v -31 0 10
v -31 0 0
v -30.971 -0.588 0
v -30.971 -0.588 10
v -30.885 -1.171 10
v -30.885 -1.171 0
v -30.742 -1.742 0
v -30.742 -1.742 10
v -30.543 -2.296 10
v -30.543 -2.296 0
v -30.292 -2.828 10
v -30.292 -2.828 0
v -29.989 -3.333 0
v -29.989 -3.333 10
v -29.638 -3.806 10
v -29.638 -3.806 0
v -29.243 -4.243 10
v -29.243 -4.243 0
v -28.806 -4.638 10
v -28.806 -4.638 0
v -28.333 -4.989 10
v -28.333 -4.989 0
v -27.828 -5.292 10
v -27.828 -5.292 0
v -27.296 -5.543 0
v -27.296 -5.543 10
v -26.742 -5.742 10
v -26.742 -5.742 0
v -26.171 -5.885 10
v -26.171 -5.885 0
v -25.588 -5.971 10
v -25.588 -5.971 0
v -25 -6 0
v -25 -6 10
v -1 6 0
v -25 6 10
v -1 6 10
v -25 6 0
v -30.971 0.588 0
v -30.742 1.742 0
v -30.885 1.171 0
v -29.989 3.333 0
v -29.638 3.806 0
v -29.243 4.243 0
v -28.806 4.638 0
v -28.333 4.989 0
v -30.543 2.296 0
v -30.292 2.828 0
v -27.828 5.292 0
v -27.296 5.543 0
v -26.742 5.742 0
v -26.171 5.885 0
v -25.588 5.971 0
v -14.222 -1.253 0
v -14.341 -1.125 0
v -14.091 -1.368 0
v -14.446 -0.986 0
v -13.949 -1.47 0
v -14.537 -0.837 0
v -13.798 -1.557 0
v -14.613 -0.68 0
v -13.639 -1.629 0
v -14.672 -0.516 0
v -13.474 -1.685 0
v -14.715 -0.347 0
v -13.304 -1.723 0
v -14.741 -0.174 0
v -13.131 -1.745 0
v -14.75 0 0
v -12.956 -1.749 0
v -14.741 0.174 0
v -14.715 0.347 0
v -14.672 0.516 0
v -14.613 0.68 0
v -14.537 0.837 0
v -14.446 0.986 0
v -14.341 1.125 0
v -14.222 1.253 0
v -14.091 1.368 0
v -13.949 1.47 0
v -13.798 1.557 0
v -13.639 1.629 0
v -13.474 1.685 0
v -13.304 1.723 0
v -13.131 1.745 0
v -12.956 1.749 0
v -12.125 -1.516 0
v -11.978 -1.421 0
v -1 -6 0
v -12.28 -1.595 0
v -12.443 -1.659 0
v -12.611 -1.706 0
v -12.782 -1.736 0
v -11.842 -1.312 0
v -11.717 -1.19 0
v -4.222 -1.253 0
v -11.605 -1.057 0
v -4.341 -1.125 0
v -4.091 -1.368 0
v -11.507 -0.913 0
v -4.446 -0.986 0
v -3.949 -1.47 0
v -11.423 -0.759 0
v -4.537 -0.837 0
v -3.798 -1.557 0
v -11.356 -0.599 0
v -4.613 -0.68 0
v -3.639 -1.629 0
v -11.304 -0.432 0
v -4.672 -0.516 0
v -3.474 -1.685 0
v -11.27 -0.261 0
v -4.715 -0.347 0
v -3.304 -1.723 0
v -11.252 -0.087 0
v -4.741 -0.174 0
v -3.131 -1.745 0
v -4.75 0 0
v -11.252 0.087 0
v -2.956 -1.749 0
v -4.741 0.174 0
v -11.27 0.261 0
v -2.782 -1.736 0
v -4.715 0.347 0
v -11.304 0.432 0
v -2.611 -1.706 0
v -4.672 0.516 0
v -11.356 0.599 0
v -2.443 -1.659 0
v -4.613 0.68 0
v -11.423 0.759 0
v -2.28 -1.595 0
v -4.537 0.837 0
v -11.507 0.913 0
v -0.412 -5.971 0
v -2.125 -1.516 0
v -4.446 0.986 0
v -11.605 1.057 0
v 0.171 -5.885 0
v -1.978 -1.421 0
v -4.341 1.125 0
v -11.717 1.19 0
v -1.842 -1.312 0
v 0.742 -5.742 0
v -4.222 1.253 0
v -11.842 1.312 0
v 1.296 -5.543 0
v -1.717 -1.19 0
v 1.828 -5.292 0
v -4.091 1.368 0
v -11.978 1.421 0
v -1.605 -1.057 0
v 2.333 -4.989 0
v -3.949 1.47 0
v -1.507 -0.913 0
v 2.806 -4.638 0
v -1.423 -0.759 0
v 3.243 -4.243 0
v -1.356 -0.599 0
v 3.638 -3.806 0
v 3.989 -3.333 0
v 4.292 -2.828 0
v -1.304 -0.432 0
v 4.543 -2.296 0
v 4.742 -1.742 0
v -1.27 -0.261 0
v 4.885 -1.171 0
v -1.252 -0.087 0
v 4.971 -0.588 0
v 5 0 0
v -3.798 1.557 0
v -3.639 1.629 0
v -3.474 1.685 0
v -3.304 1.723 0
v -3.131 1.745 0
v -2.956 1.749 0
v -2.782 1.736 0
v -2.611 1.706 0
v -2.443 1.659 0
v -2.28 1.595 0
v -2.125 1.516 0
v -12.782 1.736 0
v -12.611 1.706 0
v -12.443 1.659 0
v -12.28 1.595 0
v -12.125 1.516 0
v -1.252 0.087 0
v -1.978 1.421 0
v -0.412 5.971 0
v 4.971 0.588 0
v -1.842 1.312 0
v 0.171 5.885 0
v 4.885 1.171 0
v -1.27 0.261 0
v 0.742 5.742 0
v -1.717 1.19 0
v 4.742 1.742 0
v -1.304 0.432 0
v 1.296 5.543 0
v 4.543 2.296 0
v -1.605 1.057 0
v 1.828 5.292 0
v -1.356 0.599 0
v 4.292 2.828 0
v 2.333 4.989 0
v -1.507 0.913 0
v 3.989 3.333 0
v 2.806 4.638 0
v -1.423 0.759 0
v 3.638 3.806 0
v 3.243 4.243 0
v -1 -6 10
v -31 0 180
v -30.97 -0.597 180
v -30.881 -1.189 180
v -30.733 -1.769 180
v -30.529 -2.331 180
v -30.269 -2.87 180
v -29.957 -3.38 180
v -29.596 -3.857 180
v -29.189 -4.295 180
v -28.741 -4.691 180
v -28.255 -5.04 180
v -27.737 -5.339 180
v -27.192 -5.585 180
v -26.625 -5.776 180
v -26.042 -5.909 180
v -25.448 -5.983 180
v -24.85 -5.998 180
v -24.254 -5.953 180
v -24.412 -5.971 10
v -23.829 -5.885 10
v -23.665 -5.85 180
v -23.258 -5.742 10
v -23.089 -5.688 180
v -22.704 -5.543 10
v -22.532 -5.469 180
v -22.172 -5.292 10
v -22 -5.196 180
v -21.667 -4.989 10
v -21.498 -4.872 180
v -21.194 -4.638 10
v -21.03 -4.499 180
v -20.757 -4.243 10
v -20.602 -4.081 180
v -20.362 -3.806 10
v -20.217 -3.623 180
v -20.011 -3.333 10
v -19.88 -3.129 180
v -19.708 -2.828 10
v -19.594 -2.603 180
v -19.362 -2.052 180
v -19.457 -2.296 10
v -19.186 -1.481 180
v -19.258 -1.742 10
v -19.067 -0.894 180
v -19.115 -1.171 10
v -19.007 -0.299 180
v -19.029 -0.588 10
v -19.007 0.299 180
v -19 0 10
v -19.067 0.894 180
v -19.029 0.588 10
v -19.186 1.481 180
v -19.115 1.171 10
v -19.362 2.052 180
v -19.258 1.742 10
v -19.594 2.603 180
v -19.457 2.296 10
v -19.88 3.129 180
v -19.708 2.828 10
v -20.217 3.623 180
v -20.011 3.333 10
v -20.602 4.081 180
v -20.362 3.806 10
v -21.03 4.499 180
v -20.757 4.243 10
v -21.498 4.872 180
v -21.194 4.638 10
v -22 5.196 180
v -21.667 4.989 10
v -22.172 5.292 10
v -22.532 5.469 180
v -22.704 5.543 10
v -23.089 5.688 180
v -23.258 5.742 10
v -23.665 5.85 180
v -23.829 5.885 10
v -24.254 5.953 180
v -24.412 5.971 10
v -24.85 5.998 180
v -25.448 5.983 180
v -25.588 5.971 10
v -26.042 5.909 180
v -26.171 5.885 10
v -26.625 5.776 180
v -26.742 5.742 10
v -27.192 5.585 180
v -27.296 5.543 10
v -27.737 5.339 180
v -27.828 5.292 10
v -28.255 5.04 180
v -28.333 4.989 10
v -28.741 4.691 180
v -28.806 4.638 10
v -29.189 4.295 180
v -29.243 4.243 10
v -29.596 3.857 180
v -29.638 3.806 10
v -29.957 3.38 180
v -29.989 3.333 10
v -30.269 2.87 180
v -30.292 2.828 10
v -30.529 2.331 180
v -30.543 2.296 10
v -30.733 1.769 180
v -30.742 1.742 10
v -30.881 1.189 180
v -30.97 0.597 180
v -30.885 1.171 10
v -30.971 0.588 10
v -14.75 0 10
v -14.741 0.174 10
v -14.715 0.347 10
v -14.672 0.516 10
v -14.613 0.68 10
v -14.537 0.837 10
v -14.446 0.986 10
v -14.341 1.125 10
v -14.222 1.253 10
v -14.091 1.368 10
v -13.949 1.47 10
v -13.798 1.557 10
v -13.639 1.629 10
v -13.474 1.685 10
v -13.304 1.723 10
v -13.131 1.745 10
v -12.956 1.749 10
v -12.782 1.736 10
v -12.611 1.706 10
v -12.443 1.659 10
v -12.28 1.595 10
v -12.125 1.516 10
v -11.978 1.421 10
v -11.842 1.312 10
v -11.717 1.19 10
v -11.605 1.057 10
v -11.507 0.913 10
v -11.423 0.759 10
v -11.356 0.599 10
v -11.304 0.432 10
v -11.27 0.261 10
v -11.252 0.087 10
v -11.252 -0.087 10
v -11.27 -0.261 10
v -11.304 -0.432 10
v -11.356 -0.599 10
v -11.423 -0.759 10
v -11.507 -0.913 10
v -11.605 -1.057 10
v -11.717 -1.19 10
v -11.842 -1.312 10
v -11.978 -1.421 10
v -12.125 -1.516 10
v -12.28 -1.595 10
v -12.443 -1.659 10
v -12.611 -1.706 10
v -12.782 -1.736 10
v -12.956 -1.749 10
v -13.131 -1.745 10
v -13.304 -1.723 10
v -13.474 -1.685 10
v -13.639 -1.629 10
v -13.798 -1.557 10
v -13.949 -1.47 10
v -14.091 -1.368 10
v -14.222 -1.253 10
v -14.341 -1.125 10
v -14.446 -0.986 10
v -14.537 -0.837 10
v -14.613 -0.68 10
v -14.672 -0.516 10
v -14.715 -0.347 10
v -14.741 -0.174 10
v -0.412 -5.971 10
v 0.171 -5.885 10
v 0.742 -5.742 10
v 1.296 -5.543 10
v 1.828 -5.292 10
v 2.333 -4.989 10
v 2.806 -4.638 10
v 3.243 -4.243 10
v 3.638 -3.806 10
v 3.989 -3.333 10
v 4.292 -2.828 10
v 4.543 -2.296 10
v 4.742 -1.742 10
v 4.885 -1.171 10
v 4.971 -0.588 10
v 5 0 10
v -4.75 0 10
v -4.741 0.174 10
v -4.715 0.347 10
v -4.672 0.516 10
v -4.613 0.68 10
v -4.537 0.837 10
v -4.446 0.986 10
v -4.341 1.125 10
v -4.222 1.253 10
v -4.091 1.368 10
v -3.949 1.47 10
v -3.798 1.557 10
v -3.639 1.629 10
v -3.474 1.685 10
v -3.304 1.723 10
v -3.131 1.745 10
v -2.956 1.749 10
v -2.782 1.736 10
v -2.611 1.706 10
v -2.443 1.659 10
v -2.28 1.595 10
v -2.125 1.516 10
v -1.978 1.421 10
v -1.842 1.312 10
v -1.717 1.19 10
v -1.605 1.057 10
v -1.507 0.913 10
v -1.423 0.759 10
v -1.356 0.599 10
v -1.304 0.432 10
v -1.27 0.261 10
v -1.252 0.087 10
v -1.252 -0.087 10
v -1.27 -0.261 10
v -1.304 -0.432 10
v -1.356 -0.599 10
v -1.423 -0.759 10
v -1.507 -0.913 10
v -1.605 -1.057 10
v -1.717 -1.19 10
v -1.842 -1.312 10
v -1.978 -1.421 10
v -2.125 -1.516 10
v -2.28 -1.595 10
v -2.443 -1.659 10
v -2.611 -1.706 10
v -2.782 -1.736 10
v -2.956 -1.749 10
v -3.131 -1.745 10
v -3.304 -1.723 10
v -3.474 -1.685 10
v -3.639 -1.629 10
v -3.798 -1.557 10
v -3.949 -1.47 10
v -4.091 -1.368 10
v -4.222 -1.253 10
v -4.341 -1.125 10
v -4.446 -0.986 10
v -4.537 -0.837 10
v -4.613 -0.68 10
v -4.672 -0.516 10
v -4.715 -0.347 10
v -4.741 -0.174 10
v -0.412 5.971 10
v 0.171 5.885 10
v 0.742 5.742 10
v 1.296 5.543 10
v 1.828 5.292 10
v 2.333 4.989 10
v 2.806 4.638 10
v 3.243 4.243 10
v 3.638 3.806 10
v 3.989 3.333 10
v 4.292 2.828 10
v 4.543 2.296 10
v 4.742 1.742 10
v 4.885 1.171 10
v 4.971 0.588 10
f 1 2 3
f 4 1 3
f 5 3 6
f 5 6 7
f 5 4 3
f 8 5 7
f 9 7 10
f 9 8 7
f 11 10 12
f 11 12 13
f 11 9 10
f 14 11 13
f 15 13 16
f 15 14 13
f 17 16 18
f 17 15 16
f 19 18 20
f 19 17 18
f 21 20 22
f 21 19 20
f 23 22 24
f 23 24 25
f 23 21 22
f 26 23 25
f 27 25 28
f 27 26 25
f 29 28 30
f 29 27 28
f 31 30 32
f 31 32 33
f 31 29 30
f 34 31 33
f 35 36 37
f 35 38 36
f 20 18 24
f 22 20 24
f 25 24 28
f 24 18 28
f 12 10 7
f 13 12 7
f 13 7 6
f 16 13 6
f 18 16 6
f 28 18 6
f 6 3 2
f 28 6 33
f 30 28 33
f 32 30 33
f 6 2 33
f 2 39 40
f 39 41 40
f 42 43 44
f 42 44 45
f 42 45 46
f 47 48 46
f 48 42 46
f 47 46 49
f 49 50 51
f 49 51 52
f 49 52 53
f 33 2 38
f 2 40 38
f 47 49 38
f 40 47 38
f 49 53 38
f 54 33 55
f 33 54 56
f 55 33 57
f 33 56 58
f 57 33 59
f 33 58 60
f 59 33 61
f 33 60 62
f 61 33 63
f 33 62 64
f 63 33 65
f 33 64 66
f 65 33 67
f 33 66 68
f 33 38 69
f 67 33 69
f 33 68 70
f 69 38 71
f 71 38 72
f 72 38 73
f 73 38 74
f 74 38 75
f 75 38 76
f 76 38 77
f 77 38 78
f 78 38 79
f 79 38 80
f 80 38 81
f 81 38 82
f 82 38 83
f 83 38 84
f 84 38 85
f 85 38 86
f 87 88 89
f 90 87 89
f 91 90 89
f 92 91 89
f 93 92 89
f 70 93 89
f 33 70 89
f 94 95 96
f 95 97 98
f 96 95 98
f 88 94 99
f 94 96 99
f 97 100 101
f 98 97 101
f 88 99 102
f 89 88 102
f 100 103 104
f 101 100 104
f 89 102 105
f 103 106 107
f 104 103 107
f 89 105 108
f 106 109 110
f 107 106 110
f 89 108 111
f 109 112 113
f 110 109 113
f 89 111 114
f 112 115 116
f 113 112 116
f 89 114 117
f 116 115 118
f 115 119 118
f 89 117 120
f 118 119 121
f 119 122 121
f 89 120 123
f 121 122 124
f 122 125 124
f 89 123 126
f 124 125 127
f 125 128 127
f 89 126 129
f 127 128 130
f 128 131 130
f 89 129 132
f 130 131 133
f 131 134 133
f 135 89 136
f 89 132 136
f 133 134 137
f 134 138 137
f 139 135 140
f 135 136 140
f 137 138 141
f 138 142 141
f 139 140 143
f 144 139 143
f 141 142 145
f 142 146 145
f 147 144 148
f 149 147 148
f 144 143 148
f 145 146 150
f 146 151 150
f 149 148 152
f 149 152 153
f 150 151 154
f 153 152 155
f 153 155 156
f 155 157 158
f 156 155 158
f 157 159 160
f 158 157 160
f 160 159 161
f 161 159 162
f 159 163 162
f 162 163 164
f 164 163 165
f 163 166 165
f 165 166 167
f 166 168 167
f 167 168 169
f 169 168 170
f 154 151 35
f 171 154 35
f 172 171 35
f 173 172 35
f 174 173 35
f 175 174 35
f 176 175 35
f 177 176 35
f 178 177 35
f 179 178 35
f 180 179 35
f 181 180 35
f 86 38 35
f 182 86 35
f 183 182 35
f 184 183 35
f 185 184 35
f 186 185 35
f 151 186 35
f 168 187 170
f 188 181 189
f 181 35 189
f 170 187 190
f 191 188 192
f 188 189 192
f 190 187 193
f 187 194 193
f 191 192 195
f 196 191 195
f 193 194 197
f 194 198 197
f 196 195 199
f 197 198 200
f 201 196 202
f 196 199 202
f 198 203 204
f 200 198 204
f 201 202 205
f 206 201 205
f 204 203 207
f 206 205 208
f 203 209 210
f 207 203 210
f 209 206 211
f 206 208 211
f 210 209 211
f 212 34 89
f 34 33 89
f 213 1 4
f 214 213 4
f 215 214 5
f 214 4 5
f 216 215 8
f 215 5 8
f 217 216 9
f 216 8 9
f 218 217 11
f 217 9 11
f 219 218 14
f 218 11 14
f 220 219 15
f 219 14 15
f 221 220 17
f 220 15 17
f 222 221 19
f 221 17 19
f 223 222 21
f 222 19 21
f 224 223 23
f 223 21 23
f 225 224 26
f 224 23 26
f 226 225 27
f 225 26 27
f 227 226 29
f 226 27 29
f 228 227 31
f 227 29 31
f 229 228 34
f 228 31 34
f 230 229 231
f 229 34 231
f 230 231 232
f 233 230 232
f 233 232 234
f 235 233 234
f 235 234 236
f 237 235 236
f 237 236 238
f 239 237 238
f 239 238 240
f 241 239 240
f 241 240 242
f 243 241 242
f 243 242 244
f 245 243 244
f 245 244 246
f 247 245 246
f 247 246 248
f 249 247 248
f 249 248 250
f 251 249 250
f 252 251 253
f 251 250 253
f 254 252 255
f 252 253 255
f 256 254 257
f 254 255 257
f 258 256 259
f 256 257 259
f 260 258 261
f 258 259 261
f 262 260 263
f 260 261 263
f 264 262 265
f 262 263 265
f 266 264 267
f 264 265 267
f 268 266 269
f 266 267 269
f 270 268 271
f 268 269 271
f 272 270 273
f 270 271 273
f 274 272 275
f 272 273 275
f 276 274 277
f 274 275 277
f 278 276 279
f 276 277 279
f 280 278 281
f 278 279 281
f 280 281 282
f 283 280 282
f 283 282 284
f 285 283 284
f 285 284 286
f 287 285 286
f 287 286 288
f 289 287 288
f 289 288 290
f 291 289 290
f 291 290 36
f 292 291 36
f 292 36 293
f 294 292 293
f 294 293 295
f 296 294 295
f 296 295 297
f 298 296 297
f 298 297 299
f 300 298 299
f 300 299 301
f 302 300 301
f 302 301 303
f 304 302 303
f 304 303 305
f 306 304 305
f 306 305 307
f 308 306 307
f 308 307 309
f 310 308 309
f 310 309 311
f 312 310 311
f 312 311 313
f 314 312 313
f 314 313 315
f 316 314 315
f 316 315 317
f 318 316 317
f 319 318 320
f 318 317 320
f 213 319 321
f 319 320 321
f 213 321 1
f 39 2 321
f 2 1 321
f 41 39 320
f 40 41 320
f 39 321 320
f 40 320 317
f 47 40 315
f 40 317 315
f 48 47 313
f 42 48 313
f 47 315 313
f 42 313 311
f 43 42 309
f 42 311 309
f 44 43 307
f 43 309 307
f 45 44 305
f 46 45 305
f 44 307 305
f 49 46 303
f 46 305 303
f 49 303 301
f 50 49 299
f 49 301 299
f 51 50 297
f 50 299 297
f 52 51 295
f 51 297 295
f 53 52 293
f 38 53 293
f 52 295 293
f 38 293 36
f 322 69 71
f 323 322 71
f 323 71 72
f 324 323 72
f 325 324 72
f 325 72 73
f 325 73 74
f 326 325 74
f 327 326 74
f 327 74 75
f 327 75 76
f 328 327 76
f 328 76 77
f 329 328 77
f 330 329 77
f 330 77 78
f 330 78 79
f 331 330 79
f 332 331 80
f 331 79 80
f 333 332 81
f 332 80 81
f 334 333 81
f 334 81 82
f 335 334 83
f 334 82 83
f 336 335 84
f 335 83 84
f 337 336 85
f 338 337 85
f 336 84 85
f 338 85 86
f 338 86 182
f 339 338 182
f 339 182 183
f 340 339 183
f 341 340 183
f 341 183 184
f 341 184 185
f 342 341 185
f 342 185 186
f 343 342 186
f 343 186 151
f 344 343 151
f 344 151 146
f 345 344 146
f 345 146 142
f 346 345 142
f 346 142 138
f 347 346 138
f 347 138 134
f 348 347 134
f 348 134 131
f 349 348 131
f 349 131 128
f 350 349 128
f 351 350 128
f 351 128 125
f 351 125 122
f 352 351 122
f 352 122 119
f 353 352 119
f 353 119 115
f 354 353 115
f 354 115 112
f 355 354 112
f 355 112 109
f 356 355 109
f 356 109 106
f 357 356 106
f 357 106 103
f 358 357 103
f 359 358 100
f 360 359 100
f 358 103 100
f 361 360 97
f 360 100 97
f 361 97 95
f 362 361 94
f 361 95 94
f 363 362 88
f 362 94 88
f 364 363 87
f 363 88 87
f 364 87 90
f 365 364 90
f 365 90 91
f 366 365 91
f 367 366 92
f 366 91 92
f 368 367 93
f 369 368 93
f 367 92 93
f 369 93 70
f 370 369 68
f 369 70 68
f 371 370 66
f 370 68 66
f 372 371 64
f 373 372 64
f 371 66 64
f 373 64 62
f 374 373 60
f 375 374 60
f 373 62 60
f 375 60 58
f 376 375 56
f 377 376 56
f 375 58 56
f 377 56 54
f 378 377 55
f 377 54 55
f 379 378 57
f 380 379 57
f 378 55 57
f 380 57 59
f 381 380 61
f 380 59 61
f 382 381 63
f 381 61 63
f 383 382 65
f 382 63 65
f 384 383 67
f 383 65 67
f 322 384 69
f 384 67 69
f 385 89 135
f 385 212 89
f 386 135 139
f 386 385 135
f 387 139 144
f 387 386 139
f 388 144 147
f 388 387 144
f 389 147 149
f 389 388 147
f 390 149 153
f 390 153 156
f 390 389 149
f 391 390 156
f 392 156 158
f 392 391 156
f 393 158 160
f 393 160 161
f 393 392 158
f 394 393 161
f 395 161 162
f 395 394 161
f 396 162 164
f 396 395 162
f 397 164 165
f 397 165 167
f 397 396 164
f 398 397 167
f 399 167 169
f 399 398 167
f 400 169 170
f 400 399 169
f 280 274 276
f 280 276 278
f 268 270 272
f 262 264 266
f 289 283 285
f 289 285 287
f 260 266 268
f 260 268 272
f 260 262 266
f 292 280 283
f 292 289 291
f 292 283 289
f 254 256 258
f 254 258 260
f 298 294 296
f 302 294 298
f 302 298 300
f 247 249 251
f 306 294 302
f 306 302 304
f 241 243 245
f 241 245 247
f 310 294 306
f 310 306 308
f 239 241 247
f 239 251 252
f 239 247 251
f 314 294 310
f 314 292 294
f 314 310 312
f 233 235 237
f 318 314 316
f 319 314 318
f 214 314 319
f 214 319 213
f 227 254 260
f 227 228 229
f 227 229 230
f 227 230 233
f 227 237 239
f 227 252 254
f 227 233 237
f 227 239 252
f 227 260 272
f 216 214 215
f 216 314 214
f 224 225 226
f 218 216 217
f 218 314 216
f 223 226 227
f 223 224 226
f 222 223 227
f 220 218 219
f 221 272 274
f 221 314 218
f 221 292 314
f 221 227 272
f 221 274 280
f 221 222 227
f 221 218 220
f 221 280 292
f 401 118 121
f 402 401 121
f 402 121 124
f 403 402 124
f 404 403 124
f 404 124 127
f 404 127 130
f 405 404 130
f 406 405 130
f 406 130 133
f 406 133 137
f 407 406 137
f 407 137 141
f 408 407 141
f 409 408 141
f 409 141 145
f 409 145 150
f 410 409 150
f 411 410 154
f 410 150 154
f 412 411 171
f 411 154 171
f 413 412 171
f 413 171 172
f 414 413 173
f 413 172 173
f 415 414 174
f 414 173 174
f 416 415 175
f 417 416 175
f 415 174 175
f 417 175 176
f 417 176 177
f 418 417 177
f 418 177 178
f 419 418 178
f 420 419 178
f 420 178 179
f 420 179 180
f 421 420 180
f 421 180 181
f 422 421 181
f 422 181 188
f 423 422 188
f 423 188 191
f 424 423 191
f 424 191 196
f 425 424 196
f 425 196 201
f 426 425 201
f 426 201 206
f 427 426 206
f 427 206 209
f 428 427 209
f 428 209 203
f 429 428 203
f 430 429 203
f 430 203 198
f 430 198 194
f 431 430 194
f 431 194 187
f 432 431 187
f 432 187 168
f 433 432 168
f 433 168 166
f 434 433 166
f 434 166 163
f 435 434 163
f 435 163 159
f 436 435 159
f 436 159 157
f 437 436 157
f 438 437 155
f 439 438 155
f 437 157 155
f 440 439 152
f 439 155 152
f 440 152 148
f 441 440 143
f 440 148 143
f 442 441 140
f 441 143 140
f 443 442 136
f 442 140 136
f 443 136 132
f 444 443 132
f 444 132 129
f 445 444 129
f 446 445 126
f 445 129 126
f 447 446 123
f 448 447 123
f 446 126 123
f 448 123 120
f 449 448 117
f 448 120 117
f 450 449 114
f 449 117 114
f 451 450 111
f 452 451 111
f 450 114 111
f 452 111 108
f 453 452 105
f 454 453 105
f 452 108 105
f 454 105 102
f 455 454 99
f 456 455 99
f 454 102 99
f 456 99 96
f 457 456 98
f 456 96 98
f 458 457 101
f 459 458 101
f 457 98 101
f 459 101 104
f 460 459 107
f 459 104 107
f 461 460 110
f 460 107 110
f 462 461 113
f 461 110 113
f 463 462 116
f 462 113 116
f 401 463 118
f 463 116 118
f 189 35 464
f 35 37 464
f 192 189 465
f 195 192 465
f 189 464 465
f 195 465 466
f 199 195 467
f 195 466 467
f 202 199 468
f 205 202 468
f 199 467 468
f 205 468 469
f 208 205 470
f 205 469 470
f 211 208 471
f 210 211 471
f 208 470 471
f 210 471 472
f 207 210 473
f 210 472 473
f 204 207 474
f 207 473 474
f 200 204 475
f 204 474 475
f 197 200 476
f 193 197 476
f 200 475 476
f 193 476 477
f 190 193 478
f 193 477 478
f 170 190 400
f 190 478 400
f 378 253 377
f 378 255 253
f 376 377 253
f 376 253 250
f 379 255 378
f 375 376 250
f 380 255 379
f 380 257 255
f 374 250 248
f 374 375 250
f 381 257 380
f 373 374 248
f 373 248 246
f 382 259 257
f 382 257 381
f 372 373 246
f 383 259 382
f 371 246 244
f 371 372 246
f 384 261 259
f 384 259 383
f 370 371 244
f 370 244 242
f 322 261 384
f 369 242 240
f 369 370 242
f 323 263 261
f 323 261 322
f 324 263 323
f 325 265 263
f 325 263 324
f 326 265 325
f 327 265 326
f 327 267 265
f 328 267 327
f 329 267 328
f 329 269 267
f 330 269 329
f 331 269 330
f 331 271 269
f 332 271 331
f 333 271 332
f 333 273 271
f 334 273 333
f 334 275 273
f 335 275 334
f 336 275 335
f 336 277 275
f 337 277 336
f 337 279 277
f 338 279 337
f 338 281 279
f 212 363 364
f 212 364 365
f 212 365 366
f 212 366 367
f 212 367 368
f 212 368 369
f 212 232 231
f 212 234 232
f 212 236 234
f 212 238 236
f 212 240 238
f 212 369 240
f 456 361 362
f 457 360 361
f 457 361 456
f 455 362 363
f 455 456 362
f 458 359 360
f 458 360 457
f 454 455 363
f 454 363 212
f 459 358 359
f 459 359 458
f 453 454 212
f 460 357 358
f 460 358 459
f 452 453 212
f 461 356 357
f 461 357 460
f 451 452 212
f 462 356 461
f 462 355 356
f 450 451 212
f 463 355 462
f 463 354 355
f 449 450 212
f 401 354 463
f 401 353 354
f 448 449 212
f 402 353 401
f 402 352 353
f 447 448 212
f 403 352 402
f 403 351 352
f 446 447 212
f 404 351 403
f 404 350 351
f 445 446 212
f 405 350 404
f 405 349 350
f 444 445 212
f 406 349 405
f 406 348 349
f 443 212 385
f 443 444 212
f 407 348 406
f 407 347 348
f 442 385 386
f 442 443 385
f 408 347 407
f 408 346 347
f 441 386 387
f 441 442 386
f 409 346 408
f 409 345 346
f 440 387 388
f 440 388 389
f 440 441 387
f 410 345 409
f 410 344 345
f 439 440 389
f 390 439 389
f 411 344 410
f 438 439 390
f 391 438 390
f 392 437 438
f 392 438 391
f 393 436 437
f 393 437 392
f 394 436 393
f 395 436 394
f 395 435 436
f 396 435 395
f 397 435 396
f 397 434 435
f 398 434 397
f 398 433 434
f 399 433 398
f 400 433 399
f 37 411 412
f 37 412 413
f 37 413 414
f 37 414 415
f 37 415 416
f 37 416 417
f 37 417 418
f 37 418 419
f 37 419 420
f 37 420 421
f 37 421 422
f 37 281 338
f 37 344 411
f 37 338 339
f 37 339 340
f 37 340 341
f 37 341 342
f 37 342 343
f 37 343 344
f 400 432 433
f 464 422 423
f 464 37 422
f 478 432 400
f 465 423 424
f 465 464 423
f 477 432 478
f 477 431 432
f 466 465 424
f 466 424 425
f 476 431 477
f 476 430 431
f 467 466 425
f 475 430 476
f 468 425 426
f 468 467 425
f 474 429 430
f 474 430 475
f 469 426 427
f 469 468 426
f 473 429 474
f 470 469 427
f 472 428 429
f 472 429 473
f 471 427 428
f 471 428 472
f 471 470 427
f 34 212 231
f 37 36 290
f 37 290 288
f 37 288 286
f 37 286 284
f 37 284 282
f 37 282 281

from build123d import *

# Parameters (mm, degrees)
SKETCH1_W           = 36
SKETCH1_H           = 12
BOSS_EXTRUDE1_DEPTH = 10
SKETCH2_R           = 6
BOSS_EXTRUDE2_DEPTH = 170
CUT_EXTRUDE4_REACH  = 184.748
SKETCH7_R           = 1.75
FILLET1_R           = 6


with BuildPart() as part:
    # Sketch1 → Boss-Extrude1 (new body)
    with BuildSketch(Plane.XY):
        with Locations((-13, 0)):
            Rectangle(SKETCH1_W, SKETCH1_H)
    extrude(amount=BOSS_EXTRUDE1_DEPTH)

    # Sketch2 → Boss-Extrude2 (add)
    with BuildSketch(Plane.XY.offset(10)):
        with Locations(Location((-25, 0, 0), (0, 0, 180))):
            Circle(SKETCH2_R)
    extrude(amount=BOSS_EXTRUDE2_DEPTH)

    # Sketch7 → Cut-Extrude4 (cut, up to next)
    with BuildSketch(Plane(origin=(0, 0, 0), x_dir=(-1, 0, 0), z_dir=(0, 0, -1)), mode=Mode.PRIVATE) as cut_extrude4_sk1:
        with Locations((3, 0)):
            Circle(SKETCH7_R)
    cut_extrude4_tool1 = extrude(cut_extrude4_sk1.sketch, amount=-CUT_EXTRUDE4_REACH, mode=Mode.PRIVATE) & part.part
    # Sketch7 → Cut-Extrude4 (cut, up to next)
    with BuildSketch(Plane(origin=(0, 0, 0), x_dir=(-1, 0, 0), z_dir=(0, 0, -1)), mode=Mode.PRIVATE) as cut_extrude4_sk2:
        with Locations((13, 0)):
            Circle(SKETCH7_R)
    cut_extrude4_tool2 = extrude(cut_extrude4_sk2.sketch, amount=-CUT_EXTRUDE4_REACH, mode=Mode.PRIVATE) & part.part
    add(cut_extrude4_tool1.solids().sort_by_distance((-3, 0, 0))[0], mode=Mode.SUBTRACT)
    add(cut_extrude4_tool2.solids().sort_by_distance((-13, 0, 0))[0], mode=Mode.SUBTRACT)

    # Fillet1
    fillet1_edges = [part.edges().sort_by_distance(p)[0] for p in [
        (5, -6, 5),
        (5, 6, 5),
        (-31, -6, 5),
        (-31, 6, 5),
    ]]
    fillet(fillet1_edges, radius=FILLET1_R - 0.0001)  # a hair under: the kernel refuses the full size


solid = part.part
